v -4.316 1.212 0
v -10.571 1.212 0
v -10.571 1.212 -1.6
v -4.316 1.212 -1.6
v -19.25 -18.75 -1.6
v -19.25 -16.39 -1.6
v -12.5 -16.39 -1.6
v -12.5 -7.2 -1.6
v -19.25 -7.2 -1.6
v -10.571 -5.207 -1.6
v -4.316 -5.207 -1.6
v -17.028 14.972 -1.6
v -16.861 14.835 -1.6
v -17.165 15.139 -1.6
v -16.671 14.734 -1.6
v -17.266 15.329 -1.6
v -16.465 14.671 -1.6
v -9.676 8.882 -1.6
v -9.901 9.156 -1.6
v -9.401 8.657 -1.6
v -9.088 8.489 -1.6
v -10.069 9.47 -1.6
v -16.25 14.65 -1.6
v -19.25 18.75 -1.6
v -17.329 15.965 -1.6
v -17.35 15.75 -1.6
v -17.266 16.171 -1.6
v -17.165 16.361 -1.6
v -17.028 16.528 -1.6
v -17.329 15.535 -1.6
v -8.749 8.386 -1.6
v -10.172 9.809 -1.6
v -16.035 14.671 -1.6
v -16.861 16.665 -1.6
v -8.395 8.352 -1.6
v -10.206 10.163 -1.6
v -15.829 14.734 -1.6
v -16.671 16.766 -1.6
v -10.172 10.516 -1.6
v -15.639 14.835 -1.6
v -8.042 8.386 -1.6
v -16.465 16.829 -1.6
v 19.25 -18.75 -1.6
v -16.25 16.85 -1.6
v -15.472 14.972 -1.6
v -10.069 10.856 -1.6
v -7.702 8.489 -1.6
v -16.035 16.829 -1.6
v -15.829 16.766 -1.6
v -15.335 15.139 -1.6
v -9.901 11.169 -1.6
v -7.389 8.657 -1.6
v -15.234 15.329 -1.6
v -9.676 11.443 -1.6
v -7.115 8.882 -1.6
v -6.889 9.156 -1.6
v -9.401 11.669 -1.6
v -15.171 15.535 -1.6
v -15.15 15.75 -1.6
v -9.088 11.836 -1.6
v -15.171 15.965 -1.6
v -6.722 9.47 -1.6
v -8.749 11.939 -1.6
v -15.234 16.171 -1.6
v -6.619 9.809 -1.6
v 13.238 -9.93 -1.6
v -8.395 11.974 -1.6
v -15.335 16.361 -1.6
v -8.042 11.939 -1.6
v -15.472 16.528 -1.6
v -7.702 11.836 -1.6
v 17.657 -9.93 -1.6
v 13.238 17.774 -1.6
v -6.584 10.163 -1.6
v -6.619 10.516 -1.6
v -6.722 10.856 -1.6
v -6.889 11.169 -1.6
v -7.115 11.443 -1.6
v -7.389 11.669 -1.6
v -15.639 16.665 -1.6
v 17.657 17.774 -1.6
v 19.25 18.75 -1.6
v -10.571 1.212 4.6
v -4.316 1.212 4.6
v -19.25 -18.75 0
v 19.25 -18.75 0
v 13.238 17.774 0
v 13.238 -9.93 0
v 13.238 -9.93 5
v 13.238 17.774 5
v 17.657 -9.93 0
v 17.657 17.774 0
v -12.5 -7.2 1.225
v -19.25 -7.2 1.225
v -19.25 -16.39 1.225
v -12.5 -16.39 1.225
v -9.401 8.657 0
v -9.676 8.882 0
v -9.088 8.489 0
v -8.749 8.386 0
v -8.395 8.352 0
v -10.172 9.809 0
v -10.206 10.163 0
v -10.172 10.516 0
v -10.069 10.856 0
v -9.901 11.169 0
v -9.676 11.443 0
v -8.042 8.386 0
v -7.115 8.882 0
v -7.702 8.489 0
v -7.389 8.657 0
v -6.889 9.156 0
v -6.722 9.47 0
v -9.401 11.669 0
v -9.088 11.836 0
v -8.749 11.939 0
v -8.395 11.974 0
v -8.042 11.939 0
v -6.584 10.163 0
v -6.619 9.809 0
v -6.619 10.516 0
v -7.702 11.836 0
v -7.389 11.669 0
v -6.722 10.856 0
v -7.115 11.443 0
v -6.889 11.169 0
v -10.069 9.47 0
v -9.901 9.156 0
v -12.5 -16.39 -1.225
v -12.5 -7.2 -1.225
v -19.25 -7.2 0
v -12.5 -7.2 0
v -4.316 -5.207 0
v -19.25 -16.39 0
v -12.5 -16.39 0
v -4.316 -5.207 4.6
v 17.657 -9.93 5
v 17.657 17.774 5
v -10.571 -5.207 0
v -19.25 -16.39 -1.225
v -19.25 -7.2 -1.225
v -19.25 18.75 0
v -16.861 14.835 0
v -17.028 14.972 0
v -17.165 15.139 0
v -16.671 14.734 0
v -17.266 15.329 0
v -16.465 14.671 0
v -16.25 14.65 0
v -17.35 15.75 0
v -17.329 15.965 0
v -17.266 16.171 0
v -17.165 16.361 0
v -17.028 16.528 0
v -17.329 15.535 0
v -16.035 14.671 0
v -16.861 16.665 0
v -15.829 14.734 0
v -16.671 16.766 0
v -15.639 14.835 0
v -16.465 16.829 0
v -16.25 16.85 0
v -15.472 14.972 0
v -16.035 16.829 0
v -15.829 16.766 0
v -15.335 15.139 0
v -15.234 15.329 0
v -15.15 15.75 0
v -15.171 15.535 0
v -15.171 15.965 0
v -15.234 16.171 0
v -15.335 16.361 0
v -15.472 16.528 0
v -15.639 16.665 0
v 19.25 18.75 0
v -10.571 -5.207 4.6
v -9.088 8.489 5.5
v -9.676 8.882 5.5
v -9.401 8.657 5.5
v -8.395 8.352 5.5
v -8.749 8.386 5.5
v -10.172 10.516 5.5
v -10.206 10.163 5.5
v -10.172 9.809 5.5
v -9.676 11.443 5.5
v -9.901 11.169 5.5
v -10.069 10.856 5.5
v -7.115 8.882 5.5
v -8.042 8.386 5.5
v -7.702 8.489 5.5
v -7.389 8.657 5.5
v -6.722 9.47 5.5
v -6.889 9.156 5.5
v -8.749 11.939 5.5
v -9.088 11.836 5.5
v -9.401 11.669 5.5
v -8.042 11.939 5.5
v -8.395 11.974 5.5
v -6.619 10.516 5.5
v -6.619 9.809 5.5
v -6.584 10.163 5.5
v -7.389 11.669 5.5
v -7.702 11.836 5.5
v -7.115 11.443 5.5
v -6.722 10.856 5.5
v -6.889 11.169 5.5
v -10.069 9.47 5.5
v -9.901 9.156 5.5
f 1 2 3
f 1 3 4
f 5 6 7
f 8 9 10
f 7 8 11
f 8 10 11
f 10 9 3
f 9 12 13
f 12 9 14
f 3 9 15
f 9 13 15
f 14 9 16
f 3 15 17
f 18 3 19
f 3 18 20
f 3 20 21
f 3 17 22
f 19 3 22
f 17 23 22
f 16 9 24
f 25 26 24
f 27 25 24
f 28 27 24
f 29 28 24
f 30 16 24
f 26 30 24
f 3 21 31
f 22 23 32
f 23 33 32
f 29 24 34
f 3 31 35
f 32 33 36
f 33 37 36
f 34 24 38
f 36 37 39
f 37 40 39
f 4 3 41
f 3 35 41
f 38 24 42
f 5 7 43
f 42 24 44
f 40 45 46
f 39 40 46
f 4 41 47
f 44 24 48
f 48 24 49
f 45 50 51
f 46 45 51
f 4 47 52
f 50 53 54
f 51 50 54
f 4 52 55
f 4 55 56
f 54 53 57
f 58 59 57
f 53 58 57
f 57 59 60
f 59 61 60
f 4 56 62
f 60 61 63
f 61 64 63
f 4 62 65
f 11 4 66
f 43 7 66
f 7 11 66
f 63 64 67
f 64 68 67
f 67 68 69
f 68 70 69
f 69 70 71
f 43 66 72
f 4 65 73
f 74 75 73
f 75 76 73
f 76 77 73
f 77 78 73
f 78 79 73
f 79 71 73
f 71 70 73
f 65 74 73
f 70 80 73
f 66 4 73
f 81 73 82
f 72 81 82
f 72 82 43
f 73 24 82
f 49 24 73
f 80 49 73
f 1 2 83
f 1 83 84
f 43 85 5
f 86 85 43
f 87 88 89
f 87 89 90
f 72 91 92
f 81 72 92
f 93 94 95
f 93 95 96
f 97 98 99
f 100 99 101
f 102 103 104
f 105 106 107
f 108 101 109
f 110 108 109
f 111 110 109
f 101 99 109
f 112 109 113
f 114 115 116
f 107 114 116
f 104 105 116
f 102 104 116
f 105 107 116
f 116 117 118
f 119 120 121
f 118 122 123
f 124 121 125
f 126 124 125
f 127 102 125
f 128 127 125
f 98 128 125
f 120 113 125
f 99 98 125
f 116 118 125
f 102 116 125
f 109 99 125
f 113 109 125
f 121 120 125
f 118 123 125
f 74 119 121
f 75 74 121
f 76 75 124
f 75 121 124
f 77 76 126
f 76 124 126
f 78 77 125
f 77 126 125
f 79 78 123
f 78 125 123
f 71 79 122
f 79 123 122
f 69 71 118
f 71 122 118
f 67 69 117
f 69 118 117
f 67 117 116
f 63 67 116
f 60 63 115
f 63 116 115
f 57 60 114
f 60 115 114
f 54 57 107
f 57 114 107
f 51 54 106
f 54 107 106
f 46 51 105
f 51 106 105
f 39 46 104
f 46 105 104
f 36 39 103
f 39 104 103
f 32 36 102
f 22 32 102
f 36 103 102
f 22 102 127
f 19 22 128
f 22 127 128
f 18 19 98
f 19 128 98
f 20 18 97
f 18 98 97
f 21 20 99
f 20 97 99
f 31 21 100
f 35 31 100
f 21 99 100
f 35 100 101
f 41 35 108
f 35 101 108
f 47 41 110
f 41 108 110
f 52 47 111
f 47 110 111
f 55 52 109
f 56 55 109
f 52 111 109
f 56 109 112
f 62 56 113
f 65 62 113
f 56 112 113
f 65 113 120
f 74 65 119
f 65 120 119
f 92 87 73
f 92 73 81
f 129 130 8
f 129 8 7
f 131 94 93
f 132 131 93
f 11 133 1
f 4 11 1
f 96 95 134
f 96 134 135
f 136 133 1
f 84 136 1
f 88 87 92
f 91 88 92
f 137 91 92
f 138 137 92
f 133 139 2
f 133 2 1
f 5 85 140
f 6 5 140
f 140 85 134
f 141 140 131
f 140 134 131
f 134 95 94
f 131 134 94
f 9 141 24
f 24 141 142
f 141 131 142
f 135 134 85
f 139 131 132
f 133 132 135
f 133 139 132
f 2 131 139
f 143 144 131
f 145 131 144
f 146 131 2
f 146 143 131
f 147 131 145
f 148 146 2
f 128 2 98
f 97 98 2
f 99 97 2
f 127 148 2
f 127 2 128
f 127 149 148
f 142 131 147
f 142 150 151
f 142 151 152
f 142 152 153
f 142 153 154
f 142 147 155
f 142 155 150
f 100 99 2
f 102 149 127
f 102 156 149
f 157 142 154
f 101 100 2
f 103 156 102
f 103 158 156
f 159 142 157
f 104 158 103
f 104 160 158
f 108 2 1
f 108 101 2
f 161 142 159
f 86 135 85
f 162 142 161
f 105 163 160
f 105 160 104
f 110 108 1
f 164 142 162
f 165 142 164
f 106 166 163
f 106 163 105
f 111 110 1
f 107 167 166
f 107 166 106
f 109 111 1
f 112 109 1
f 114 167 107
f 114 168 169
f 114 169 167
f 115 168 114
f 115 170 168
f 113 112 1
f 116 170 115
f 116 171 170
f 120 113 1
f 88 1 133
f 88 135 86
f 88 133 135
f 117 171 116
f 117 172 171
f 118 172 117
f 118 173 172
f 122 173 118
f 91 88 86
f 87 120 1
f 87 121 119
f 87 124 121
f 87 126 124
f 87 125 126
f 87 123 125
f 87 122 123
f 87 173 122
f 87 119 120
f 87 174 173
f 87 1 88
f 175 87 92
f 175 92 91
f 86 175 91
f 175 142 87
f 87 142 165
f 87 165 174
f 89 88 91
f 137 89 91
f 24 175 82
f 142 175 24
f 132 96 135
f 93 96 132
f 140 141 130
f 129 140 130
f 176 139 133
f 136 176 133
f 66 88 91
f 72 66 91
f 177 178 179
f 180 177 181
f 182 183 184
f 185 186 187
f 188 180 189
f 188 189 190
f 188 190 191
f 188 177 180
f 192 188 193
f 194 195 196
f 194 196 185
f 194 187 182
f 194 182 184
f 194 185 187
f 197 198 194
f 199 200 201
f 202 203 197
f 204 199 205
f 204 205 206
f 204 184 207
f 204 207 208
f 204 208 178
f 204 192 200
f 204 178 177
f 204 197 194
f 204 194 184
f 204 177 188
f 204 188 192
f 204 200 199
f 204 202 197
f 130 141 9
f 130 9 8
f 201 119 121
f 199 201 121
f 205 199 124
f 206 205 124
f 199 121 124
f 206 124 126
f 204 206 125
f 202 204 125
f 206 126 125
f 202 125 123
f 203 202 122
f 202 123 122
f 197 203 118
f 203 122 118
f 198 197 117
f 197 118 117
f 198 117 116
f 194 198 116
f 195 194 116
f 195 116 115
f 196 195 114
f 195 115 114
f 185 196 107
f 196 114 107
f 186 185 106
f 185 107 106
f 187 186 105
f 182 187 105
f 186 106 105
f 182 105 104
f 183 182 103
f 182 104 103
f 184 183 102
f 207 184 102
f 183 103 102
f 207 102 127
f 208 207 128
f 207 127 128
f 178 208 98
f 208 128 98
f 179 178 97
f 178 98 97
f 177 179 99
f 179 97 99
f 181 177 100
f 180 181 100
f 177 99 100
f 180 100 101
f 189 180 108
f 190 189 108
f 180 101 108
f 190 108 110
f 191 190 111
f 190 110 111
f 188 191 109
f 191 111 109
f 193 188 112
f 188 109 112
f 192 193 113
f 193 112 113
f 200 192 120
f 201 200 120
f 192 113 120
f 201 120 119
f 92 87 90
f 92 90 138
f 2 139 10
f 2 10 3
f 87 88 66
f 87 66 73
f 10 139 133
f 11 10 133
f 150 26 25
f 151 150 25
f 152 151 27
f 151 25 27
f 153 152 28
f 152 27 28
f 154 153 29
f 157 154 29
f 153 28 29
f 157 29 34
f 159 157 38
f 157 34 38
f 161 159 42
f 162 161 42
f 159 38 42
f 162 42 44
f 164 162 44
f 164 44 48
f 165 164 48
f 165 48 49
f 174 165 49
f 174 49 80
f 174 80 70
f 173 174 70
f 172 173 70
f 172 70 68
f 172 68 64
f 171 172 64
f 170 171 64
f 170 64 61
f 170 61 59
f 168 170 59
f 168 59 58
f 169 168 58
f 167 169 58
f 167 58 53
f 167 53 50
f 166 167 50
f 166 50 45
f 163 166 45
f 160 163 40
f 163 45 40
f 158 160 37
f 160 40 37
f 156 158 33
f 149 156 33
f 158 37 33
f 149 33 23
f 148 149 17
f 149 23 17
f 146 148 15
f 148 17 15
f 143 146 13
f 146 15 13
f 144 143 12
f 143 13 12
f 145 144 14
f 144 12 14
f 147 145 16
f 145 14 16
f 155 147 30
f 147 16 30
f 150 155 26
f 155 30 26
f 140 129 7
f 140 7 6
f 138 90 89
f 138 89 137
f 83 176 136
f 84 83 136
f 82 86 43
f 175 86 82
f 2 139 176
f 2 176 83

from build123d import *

# Parameters (mm, degrees)
F0_W     = 6.25431
F0_H     = 6.418898
F0_R     = 1.811147
F0_W_2   = 4.418919
F0_H_2   = 27.703949
F1_DEPTH = 1.6
F2_DEPTH = 5
F3_DEPTH = 4.6
F4_DEPTH = 5.5
F5_D     = 2.2
F0_W_3   = 6.75
F0_H_3   = 9.19
F6_DEPTH = 1.225


with BuildPart() as f1:
    # F0 (on Top) → F1 (new body)
    with BuildSketch(Plane.XY):
        Polygon((19.25, -18.75), (19.25, 18.75), (-19.25, 18.75), (-19.25, -7.2), (-12.5, -7.2), (-12.5, -16.39), (-19.25, -16.39), (-19.25, -18.75), align=None)
        with Locations((-7.443636, -1.997309)):
            Rectangle(F0_W, F0_H, mode=Mode.SUBTRACT)
        with Locations((-8.395254, 10.16267)):
            Circle(F0_R, mode=Mode.SUBTRACT)
        with Locations((15.44768, 3.921963)):
            Rectangle(F0_W_2, F0_H_2, mode=Mode.SUBTRACT)
    extrude(amount=-F1_DEPTH)

    # F0 (on Top) → F2 (join)
    with BuildSketch(Plane.XY):
        with Locations((15.44768, 3.921963)):
            Rectangle(F0_W_2, F0_H_2)
    extrude(amount=F2_DEPTH)

    # F0 (on Top) → F3 (join)
    with BuildSketch(Plane.XY):
        with Locations((-7.443636, -1.997309)):
            Rectangle(F0_W, F0_H)
    extrude(amount=F3_DEPTH)

    # F0 (on Top) → F4 (join)
    with BuildSketch(Plane.XY):
        with Locations((-8.395254, 10.16267)):
            Circle(F0_R)
    extrude(amount=F4_DEPTH)

    # F5 (through all)
    with Locations(Plane.XY):
        with Locations((-16.25, 15.75)):
            Hole(F5_D / 2)

    # F0 (on Top) → F6 (join, symmetric)
    with BuildSketch(Plane.XY):
        with Locations((-15.875, -11.795)):
            Rectangle(F0_W_3, F0_H_3)
    extrude(amount=F6_DEPTH, both=True)


solid = f1.part
